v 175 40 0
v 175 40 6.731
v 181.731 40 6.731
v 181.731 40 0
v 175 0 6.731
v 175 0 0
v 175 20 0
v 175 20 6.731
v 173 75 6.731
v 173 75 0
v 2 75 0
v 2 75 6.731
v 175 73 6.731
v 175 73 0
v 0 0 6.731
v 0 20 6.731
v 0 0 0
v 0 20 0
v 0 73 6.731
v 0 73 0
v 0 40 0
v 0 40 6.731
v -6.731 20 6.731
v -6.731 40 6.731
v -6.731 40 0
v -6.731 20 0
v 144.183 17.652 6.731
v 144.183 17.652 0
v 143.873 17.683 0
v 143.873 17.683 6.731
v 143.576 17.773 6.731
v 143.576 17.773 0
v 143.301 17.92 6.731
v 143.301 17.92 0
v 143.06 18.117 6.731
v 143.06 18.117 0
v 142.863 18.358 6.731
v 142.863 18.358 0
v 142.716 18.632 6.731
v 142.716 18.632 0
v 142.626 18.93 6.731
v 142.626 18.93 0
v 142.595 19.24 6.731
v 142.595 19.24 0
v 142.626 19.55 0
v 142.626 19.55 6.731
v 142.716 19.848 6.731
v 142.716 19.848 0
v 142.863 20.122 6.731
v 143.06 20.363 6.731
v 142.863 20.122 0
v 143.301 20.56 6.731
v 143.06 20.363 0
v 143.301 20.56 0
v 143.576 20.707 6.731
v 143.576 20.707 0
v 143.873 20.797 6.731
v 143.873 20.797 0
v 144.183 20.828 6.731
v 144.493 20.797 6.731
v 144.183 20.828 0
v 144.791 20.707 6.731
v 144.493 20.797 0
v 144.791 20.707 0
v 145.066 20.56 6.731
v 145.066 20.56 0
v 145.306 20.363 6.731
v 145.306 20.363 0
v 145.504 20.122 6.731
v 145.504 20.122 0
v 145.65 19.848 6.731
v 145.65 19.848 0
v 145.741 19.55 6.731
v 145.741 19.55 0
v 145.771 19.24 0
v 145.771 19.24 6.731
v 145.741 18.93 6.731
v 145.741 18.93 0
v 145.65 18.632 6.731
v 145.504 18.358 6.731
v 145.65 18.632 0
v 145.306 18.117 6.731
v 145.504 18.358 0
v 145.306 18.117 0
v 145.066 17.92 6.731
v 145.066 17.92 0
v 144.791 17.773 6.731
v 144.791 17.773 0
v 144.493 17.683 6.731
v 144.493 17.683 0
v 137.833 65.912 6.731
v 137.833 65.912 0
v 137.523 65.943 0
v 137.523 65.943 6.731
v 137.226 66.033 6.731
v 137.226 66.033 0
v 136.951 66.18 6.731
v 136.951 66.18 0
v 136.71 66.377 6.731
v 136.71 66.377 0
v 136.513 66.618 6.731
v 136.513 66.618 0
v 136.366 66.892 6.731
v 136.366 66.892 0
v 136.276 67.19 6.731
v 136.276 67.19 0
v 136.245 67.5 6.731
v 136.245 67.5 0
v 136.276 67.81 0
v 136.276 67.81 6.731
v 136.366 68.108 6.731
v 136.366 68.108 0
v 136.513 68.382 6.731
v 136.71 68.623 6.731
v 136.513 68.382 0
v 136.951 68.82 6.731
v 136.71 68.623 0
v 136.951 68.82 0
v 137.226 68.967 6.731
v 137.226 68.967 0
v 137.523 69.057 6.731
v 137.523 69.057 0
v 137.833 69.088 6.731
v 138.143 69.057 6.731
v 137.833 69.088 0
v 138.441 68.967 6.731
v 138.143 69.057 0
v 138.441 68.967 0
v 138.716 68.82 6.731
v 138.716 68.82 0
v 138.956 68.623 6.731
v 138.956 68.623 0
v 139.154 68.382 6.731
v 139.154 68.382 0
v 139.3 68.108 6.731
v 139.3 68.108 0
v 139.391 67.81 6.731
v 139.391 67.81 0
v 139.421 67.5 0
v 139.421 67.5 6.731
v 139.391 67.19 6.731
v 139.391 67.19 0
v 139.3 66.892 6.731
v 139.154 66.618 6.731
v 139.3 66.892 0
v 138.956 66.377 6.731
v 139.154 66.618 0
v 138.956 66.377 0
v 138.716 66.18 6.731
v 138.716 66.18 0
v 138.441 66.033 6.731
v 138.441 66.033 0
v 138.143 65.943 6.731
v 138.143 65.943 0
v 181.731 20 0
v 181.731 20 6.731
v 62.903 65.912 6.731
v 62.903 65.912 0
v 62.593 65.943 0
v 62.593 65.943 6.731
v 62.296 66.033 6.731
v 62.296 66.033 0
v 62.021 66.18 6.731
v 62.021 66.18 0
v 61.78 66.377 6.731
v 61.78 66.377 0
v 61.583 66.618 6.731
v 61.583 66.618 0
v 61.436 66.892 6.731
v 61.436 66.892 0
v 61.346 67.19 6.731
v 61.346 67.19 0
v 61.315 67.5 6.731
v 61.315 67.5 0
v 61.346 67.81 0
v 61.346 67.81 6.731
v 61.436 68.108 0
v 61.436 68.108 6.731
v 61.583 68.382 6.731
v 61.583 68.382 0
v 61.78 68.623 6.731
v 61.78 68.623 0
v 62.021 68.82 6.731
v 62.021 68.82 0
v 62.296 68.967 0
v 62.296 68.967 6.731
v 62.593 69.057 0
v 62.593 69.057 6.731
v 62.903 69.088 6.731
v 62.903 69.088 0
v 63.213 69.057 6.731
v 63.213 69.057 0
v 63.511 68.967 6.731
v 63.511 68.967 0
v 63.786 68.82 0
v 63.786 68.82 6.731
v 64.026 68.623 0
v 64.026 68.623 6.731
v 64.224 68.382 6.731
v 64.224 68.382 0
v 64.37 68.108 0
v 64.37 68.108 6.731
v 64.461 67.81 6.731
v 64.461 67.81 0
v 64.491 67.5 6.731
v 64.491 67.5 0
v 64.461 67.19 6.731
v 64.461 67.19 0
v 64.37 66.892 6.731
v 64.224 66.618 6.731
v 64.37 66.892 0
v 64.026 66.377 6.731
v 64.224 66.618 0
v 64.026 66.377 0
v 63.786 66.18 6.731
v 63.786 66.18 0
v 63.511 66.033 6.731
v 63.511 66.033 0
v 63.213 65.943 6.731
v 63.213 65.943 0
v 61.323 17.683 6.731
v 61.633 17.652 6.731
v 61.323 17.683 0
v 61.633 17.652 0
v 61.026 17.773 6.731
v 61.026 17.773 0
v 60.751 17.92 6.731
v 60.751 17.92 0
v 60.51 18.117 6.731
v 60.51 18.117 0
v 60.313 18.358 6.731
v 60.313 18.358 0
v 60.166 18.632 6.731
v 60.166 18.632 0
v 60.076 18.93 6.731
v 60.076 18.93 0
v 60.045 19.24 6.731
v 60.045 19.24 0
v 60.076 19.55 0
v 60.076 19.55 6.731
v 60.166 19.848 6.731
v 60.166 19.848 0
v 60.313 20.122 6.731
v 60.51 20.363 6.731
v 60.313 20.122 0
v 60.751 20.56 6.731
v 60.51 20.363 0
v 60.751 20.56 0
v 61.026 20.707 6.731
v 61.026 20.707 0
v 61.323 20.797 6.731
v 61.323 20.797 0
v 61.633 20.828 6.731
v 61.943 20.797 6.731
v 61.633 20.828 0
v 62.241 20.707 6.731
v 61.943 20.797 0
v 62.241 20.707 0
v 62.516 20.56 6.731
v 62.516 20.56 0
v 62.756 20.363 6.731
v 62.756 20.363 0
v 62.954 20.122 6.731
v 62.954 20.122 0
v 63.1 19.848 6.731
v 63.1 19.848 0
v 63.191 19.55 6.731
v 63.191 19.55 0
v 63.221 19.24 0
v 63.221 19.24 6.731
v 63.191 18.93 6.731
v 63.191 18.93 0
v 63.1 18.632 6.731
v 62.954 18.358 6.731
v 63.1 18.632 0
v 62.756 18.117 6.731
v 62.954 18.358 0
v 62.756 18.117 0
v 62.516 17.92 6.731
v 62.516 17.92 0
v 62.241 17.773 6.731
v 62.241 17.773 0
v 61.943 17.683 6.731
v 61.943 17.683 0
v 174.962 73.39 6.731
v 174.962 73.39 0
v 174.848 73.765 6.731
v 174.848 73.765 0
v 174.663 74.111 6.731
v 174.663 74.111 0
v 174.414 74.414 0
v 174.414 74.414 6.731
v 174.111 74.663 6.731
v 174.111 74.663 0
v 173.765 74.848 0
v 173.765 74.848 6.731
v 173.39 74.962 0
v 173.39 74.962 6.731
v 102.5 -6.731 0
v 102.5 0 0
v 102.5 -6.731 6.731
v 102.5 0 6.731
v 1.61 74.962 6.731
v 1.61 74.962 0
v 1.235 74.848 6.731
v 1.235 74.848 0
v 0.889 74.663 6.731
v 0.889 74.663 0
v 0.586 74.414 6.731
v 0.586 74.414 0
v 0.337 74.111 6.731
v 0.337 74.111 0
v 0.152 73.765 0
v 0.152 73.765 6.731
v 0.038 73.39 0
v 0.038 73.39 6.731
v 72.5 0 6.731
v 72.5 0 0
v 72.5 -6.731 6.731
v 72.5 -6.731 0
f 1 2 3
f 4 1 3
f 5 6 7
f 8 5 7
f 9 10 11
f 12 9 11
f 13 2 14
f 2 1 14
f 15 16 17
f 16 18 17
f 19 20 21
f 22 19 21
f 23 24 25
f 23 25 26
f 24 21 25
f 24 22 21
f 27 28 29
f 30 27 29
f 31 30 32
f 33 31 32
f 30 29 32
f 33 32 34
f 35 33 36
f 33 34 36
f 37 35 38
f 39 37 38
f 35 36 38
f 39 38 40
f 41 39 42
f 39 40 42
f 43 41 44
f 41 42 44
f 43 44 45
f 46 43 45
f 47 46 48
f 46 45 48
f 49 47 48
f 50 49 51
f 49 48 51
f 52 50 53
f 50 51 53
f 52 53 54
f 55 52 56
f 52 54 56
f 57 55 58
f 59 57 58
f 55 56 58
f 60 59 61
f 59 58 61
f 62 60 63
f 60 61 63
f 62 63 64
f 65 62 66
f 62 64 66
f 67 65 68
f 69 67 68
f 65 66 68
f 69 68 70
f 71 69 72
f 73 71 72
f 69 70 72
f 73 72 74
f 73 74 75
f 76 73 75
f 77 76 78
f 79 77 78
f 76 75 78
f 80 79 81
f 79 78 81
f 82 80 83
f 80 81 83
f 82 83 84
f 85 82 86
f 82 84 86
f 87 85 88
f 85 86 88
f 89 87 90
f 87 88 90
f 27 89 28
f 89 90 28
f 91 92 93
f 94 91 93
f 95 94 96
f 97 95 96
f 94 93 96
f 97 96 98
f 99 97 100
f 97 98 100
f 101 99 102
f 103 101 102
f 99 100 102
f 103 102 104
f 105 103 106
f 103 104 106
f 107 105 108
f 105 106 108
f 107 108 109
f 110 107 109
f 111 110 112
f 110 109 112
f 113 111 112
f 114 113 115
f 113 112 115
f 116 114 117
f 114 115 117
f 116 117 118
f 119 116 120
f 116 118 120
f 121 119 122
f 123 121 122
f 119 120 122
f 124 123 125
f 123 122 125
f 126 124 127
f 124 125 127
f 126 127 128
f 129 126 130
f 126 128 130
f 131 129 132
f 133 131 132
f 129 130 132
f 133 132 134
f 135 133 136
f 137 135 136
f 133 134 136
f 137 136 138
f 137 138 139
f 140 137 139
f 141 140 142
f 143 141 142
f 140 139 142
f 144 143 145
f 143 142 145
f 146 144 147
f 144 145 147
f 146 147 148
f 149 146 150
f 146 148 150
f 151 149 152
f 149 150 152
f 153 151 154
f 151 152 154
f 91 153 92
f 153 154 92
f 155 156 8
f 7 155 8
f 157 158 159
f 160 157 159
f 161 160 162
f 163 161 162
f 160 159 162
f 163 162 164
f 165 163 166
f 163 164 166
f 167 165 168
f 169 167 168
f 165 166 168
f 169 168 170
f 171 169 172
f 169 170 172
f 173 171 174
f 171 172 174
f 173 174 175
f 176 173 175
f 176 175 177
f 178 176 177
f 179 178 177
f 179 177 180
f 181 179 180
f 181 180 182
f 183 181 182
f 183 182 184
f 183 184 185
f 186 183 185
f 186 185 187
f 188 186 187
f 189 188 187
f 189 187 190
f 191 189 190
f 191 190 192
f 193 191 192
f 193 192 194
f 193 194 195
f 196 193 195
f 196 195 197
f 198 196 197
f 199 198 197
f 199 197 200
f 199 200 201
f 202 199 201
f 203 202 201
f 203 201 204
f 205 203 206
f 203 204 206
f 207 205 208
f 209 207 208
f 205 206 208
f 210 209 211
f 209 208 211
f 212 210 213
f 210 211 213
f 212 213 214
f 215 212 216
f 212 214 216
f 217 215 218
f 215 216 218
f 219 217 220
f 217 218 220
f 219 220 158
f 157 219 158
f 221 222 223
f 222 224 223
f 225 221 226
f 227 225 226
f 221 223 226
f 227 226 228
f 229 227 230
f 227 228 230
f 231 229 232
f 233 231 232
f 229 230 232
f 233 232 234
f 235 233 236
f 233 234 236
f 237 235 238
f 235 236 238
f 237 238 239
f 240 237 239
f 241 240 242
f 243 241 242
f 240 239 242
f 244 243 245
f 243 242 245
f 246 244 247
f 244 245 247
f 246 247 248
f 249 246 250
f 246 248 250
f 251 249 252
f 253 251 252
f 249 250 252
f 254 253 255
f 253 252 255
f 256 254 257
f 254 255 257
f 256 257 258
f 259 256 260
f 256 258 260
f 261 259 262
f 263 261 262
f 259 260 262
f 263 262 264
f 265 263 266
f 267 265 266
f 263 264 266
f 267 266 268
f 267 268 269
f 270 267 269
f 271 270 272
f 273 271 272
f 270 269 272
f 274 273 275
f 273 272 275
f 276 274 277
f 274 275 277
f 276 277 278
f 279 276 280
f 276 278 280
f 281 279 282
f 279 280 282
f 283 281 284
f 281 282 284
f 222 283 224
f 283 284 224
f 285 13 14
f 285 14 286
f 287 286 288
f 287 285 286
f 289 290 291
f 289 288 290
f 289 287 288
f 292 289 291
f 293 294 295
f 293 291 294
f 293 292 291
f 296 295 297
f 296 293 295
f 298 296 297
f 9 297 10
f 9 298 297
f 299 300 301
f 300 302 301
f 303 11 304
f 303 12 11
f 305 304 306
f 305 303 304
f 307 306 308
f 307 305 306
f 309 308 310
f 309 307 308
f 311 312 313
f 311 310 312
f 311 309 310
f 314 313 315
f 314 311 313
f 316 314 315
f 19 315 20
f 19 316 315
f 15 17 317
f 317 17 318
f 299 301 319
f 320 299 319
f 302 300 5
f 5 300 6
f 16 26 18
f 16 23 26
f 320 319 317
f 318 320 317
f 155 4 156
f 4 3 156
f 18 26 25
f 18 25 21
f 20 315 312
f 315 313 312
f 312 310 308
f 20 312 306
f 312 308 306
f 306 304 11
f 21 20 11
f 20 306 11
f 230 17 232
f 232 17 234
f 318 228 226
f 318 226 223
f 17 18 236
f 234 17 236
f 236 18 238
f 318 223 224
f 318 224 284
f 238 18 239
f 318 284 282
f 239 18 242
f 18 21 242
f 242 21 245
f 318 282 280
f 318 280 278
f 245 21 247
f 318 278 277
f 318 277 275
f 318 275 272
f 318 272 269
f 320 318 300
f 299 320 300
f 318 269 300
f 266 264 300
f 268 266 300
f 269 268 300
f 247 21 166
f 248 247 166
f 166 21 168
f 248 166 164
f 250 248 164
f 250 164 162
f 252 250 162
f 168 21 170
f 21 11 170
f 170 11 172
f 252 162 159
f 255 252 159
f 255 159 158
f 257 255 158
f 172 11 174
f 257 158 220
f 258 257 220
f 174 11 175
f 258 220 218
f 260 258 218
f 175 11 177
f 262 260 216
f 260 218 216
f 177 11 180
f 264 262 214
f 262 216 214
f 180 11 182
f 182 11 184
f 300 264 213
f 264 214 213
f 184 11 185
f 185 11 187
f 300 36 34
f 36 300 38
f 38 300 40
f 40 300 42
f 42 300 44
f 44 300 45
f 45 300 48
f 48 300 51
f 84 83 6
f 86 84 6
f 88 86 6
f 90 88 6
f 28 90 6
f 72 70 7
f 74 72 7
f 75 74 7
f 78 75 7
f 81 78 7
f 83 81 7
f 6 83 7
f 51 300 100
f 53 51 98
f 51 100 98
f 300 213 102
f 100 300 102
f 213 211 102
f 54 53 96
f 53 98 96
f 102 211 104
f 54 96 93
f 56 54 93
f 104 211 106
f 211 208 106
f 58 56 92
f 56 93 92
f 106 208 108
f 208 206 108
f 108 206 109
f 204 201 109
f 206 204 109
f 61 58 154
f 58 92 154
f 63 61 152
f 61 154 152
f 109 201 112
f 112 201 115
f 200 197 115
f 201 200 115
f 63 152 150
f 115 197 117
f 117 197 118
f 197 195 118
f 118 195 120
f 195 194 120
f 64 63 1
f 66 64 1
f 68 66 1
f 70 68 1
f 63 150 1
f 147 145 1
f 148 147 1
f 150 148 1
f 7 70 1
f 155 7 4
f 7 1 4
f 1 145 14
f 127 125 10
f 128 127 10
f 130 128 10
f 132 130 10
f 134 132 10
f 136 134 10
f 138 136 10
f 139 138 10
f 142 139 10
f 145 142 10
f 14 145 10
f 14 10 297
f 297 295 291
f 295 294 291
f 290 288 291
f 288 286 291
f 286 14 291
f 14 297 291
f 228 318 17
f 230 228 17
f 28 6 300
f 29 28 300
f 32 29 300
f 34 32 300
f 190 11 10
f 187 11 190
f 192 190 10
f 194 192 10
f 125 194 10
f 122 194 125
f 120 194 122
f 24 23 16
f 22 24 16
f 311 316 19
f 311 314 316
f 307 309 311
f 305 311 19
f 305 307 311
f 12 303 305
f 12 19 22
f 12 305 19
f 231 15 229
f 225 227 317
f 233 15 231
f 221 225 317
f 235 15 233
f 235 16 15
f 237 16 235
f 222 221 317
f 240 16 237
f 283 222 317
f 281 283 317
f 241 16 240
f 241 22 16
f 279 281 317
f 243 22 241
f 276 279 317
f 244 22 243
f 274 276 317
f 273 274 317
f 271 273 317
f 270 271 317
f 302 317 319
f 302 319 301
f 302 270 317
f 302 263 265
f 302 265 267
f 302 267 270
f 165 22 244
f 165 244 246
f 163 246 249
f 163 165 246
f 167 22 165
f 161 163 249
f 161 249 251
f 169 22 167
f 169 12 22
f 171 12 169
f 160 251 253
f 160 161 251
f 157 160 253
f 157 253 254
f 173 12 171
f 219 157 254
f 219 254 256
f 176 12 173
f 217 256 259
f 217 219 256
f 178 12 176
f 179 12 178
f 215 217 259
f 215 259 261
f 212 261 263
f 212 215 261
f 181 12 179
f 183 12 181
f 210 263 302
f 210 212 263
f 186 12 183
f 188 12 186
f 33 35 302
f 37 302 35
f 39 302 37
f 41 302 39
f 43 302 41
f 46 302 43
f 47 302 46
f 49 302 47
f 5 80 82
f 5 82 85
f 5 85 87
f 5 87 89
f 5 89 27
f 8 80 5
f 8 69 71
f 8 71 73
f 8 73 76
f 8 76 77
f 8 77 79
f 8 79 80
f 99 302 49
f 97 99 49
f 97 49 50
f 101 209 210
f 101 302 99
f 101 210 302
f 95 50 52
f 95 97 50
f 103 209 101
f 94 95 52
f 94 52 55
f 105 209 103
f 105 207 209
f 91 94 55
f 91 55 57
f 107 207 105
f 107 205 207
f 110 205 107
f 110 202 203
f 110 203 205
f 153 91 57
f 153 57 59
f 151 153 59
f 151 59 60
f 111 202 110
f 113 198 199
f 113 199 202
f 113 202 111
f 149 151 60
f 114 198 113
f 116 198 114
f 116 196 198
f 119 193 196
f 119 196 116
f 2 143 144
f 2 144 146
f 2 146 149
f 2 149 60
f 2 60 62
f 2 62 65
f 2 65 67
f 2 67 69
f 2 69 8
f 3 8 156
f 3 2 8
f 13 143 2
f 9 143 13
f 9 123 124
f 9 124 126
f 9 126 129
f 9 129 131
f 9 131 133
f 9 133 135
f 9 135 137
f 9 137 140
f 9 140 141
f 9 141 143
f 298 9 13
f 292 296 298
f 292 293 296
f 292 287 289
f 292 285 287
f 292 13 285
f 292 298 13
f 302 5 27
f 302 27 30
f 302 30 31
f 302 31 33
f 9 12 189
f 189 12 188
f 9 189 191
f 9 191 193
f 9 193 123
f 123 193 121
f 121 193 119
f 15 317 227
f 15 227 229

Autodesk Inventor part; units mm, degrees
ref_plane "YZ Plane" through (0, 0, 0) normal (1, 0, 0) x (0, 1, 0)
ref_plane "XZ Plane" through (0, 0, 0) normal (0, 1, 0) x (-1, 0, 0)
ref_plane "XY Plane" through (0, 0, 0) normal (0, 0, 1) x (1, 0, 0)
sketch "Sketch1" plane through (0, 0, 0) normal (0, 0, 1) x (1, 0, 0)
  line L0 (0, 0) -> (175, 0)
  line L1 (175, 0) -> (175, 75)
  line L2 (175, 75) -> (0, 75)
  line L3 (0, 75) -> (0, 0)
  dimension "d0" = 175
  dimension "d1" = 75
extrude "Extrusion1" add sketch "Sketch1" along normal blind 6.731
sketch "Sketch2" plane through (0, 0, 6.731) normal (0, 0, 1) x (1, 0, 0)
  line L0 (0, 0) -> (175, 0) projected
  line L1 (175, 0) -> (175, 75) projected
  line L2 (175, 75) -> (0, 75) projected
  line L3 (0, 75) -> (0, 0) projected
  line L4 (61.6333, 19.24) -> (144.1833, 19.24)
  line L5 (144.1833, 19.24) -> (144.1833, 67.5)
  line L6 (144.1833, 67.5) -> (137.8333, 67.5)
  line L7 (137.8333, 67.5) -> (62.9033, 67.5)
  line L8 (62.9033, 67.5) -> (61.6333, 67.5)
  line L9 (61.6333, 67.5) -> (61.6333, 19.24)
  dimension "d9" = 1.27
  dimension "d10" = 48.26
  dimension "d12" = 82.55
  dimension "d13" = 74.93
  dimension "d15" = 61.6333
  dimension "d16" = 30.8167
  dimension "d17" = 7.5
hole "Hole1" at (62.9033, 67.5, 6.731) at (144.1833, 19.24, 6.731) at (61.6333, 19.24, 6.731) at (137.8333, 67.5, 6.731) direction (0, 0, -1) diameter 3.176 end through all
sketch "Sketch3" plane through (0, 0, 6.731) normal (0, 0, 1) x (1, 0, 0)
  line L0 (0, 0) -> (175, 0) projected
  line L1 (175, 0) -> (175, 75) projected
  line L2 (0, 75) -> (0, 0) projected
  line L3 (72.5, 0) -> (102.5, 0)
  line L4 (102.5, 0) -> (102.5, -6.731)
  line L5 (102.5, -6.731) -> (72.5, -6.731)
  line L6 (72.5, -6.731) -> (72.5, 0)
  line L7 (0, 40) -> (-6.731, 40)
  line L8 (-6.731, 40) -> (-6.731, 20)
  line L9 (-6.731, 20) -> (0, 20)
  line L10 (0, 20) -> (0, 40)
  line L11 (175, 40) -> (181.731, 40)
  line L12 (181.731, 40) -> (181.731, 20)
  line L13 (181.731, 20) -> (175, 20)
  line L14 (175, 20) -> (175, 40)
  point P0 (87.5, -6.731)
  point P1 (87.5, 0)
  point P2 (-6.731, 30)
  point P3 (181.731, 30)
  dimension "d25" = 6.731
  dimension "d26" = 30
  dimension "d29" = 20
  dimension "d31" = 20
extrude "Extrusion2" add sketch "Sketch3" against normal blind 6.731
fillet "Fillet1" radius 2 2 edges at (0, 75, 3.3655) (175, 75, 3.3655)
equation "\"d7\" = THICKB"
equation "\"d15\" = 2 * d16"
equation "\"d25\" = THICKB"
equation "\"d27\" = THICKB"
equation "\"THICKA\" = 3.175"
equation "\"THICKB\" = 6.731"
equation "\"THICKC\" = 12.7"
equation "\"THICKPLY\" = 5"
equation "\"MAGDIA\" = 9.5"
equation "\"BALLDIA\" = 12"
properties part number "Mount_Mega_Bottom"
